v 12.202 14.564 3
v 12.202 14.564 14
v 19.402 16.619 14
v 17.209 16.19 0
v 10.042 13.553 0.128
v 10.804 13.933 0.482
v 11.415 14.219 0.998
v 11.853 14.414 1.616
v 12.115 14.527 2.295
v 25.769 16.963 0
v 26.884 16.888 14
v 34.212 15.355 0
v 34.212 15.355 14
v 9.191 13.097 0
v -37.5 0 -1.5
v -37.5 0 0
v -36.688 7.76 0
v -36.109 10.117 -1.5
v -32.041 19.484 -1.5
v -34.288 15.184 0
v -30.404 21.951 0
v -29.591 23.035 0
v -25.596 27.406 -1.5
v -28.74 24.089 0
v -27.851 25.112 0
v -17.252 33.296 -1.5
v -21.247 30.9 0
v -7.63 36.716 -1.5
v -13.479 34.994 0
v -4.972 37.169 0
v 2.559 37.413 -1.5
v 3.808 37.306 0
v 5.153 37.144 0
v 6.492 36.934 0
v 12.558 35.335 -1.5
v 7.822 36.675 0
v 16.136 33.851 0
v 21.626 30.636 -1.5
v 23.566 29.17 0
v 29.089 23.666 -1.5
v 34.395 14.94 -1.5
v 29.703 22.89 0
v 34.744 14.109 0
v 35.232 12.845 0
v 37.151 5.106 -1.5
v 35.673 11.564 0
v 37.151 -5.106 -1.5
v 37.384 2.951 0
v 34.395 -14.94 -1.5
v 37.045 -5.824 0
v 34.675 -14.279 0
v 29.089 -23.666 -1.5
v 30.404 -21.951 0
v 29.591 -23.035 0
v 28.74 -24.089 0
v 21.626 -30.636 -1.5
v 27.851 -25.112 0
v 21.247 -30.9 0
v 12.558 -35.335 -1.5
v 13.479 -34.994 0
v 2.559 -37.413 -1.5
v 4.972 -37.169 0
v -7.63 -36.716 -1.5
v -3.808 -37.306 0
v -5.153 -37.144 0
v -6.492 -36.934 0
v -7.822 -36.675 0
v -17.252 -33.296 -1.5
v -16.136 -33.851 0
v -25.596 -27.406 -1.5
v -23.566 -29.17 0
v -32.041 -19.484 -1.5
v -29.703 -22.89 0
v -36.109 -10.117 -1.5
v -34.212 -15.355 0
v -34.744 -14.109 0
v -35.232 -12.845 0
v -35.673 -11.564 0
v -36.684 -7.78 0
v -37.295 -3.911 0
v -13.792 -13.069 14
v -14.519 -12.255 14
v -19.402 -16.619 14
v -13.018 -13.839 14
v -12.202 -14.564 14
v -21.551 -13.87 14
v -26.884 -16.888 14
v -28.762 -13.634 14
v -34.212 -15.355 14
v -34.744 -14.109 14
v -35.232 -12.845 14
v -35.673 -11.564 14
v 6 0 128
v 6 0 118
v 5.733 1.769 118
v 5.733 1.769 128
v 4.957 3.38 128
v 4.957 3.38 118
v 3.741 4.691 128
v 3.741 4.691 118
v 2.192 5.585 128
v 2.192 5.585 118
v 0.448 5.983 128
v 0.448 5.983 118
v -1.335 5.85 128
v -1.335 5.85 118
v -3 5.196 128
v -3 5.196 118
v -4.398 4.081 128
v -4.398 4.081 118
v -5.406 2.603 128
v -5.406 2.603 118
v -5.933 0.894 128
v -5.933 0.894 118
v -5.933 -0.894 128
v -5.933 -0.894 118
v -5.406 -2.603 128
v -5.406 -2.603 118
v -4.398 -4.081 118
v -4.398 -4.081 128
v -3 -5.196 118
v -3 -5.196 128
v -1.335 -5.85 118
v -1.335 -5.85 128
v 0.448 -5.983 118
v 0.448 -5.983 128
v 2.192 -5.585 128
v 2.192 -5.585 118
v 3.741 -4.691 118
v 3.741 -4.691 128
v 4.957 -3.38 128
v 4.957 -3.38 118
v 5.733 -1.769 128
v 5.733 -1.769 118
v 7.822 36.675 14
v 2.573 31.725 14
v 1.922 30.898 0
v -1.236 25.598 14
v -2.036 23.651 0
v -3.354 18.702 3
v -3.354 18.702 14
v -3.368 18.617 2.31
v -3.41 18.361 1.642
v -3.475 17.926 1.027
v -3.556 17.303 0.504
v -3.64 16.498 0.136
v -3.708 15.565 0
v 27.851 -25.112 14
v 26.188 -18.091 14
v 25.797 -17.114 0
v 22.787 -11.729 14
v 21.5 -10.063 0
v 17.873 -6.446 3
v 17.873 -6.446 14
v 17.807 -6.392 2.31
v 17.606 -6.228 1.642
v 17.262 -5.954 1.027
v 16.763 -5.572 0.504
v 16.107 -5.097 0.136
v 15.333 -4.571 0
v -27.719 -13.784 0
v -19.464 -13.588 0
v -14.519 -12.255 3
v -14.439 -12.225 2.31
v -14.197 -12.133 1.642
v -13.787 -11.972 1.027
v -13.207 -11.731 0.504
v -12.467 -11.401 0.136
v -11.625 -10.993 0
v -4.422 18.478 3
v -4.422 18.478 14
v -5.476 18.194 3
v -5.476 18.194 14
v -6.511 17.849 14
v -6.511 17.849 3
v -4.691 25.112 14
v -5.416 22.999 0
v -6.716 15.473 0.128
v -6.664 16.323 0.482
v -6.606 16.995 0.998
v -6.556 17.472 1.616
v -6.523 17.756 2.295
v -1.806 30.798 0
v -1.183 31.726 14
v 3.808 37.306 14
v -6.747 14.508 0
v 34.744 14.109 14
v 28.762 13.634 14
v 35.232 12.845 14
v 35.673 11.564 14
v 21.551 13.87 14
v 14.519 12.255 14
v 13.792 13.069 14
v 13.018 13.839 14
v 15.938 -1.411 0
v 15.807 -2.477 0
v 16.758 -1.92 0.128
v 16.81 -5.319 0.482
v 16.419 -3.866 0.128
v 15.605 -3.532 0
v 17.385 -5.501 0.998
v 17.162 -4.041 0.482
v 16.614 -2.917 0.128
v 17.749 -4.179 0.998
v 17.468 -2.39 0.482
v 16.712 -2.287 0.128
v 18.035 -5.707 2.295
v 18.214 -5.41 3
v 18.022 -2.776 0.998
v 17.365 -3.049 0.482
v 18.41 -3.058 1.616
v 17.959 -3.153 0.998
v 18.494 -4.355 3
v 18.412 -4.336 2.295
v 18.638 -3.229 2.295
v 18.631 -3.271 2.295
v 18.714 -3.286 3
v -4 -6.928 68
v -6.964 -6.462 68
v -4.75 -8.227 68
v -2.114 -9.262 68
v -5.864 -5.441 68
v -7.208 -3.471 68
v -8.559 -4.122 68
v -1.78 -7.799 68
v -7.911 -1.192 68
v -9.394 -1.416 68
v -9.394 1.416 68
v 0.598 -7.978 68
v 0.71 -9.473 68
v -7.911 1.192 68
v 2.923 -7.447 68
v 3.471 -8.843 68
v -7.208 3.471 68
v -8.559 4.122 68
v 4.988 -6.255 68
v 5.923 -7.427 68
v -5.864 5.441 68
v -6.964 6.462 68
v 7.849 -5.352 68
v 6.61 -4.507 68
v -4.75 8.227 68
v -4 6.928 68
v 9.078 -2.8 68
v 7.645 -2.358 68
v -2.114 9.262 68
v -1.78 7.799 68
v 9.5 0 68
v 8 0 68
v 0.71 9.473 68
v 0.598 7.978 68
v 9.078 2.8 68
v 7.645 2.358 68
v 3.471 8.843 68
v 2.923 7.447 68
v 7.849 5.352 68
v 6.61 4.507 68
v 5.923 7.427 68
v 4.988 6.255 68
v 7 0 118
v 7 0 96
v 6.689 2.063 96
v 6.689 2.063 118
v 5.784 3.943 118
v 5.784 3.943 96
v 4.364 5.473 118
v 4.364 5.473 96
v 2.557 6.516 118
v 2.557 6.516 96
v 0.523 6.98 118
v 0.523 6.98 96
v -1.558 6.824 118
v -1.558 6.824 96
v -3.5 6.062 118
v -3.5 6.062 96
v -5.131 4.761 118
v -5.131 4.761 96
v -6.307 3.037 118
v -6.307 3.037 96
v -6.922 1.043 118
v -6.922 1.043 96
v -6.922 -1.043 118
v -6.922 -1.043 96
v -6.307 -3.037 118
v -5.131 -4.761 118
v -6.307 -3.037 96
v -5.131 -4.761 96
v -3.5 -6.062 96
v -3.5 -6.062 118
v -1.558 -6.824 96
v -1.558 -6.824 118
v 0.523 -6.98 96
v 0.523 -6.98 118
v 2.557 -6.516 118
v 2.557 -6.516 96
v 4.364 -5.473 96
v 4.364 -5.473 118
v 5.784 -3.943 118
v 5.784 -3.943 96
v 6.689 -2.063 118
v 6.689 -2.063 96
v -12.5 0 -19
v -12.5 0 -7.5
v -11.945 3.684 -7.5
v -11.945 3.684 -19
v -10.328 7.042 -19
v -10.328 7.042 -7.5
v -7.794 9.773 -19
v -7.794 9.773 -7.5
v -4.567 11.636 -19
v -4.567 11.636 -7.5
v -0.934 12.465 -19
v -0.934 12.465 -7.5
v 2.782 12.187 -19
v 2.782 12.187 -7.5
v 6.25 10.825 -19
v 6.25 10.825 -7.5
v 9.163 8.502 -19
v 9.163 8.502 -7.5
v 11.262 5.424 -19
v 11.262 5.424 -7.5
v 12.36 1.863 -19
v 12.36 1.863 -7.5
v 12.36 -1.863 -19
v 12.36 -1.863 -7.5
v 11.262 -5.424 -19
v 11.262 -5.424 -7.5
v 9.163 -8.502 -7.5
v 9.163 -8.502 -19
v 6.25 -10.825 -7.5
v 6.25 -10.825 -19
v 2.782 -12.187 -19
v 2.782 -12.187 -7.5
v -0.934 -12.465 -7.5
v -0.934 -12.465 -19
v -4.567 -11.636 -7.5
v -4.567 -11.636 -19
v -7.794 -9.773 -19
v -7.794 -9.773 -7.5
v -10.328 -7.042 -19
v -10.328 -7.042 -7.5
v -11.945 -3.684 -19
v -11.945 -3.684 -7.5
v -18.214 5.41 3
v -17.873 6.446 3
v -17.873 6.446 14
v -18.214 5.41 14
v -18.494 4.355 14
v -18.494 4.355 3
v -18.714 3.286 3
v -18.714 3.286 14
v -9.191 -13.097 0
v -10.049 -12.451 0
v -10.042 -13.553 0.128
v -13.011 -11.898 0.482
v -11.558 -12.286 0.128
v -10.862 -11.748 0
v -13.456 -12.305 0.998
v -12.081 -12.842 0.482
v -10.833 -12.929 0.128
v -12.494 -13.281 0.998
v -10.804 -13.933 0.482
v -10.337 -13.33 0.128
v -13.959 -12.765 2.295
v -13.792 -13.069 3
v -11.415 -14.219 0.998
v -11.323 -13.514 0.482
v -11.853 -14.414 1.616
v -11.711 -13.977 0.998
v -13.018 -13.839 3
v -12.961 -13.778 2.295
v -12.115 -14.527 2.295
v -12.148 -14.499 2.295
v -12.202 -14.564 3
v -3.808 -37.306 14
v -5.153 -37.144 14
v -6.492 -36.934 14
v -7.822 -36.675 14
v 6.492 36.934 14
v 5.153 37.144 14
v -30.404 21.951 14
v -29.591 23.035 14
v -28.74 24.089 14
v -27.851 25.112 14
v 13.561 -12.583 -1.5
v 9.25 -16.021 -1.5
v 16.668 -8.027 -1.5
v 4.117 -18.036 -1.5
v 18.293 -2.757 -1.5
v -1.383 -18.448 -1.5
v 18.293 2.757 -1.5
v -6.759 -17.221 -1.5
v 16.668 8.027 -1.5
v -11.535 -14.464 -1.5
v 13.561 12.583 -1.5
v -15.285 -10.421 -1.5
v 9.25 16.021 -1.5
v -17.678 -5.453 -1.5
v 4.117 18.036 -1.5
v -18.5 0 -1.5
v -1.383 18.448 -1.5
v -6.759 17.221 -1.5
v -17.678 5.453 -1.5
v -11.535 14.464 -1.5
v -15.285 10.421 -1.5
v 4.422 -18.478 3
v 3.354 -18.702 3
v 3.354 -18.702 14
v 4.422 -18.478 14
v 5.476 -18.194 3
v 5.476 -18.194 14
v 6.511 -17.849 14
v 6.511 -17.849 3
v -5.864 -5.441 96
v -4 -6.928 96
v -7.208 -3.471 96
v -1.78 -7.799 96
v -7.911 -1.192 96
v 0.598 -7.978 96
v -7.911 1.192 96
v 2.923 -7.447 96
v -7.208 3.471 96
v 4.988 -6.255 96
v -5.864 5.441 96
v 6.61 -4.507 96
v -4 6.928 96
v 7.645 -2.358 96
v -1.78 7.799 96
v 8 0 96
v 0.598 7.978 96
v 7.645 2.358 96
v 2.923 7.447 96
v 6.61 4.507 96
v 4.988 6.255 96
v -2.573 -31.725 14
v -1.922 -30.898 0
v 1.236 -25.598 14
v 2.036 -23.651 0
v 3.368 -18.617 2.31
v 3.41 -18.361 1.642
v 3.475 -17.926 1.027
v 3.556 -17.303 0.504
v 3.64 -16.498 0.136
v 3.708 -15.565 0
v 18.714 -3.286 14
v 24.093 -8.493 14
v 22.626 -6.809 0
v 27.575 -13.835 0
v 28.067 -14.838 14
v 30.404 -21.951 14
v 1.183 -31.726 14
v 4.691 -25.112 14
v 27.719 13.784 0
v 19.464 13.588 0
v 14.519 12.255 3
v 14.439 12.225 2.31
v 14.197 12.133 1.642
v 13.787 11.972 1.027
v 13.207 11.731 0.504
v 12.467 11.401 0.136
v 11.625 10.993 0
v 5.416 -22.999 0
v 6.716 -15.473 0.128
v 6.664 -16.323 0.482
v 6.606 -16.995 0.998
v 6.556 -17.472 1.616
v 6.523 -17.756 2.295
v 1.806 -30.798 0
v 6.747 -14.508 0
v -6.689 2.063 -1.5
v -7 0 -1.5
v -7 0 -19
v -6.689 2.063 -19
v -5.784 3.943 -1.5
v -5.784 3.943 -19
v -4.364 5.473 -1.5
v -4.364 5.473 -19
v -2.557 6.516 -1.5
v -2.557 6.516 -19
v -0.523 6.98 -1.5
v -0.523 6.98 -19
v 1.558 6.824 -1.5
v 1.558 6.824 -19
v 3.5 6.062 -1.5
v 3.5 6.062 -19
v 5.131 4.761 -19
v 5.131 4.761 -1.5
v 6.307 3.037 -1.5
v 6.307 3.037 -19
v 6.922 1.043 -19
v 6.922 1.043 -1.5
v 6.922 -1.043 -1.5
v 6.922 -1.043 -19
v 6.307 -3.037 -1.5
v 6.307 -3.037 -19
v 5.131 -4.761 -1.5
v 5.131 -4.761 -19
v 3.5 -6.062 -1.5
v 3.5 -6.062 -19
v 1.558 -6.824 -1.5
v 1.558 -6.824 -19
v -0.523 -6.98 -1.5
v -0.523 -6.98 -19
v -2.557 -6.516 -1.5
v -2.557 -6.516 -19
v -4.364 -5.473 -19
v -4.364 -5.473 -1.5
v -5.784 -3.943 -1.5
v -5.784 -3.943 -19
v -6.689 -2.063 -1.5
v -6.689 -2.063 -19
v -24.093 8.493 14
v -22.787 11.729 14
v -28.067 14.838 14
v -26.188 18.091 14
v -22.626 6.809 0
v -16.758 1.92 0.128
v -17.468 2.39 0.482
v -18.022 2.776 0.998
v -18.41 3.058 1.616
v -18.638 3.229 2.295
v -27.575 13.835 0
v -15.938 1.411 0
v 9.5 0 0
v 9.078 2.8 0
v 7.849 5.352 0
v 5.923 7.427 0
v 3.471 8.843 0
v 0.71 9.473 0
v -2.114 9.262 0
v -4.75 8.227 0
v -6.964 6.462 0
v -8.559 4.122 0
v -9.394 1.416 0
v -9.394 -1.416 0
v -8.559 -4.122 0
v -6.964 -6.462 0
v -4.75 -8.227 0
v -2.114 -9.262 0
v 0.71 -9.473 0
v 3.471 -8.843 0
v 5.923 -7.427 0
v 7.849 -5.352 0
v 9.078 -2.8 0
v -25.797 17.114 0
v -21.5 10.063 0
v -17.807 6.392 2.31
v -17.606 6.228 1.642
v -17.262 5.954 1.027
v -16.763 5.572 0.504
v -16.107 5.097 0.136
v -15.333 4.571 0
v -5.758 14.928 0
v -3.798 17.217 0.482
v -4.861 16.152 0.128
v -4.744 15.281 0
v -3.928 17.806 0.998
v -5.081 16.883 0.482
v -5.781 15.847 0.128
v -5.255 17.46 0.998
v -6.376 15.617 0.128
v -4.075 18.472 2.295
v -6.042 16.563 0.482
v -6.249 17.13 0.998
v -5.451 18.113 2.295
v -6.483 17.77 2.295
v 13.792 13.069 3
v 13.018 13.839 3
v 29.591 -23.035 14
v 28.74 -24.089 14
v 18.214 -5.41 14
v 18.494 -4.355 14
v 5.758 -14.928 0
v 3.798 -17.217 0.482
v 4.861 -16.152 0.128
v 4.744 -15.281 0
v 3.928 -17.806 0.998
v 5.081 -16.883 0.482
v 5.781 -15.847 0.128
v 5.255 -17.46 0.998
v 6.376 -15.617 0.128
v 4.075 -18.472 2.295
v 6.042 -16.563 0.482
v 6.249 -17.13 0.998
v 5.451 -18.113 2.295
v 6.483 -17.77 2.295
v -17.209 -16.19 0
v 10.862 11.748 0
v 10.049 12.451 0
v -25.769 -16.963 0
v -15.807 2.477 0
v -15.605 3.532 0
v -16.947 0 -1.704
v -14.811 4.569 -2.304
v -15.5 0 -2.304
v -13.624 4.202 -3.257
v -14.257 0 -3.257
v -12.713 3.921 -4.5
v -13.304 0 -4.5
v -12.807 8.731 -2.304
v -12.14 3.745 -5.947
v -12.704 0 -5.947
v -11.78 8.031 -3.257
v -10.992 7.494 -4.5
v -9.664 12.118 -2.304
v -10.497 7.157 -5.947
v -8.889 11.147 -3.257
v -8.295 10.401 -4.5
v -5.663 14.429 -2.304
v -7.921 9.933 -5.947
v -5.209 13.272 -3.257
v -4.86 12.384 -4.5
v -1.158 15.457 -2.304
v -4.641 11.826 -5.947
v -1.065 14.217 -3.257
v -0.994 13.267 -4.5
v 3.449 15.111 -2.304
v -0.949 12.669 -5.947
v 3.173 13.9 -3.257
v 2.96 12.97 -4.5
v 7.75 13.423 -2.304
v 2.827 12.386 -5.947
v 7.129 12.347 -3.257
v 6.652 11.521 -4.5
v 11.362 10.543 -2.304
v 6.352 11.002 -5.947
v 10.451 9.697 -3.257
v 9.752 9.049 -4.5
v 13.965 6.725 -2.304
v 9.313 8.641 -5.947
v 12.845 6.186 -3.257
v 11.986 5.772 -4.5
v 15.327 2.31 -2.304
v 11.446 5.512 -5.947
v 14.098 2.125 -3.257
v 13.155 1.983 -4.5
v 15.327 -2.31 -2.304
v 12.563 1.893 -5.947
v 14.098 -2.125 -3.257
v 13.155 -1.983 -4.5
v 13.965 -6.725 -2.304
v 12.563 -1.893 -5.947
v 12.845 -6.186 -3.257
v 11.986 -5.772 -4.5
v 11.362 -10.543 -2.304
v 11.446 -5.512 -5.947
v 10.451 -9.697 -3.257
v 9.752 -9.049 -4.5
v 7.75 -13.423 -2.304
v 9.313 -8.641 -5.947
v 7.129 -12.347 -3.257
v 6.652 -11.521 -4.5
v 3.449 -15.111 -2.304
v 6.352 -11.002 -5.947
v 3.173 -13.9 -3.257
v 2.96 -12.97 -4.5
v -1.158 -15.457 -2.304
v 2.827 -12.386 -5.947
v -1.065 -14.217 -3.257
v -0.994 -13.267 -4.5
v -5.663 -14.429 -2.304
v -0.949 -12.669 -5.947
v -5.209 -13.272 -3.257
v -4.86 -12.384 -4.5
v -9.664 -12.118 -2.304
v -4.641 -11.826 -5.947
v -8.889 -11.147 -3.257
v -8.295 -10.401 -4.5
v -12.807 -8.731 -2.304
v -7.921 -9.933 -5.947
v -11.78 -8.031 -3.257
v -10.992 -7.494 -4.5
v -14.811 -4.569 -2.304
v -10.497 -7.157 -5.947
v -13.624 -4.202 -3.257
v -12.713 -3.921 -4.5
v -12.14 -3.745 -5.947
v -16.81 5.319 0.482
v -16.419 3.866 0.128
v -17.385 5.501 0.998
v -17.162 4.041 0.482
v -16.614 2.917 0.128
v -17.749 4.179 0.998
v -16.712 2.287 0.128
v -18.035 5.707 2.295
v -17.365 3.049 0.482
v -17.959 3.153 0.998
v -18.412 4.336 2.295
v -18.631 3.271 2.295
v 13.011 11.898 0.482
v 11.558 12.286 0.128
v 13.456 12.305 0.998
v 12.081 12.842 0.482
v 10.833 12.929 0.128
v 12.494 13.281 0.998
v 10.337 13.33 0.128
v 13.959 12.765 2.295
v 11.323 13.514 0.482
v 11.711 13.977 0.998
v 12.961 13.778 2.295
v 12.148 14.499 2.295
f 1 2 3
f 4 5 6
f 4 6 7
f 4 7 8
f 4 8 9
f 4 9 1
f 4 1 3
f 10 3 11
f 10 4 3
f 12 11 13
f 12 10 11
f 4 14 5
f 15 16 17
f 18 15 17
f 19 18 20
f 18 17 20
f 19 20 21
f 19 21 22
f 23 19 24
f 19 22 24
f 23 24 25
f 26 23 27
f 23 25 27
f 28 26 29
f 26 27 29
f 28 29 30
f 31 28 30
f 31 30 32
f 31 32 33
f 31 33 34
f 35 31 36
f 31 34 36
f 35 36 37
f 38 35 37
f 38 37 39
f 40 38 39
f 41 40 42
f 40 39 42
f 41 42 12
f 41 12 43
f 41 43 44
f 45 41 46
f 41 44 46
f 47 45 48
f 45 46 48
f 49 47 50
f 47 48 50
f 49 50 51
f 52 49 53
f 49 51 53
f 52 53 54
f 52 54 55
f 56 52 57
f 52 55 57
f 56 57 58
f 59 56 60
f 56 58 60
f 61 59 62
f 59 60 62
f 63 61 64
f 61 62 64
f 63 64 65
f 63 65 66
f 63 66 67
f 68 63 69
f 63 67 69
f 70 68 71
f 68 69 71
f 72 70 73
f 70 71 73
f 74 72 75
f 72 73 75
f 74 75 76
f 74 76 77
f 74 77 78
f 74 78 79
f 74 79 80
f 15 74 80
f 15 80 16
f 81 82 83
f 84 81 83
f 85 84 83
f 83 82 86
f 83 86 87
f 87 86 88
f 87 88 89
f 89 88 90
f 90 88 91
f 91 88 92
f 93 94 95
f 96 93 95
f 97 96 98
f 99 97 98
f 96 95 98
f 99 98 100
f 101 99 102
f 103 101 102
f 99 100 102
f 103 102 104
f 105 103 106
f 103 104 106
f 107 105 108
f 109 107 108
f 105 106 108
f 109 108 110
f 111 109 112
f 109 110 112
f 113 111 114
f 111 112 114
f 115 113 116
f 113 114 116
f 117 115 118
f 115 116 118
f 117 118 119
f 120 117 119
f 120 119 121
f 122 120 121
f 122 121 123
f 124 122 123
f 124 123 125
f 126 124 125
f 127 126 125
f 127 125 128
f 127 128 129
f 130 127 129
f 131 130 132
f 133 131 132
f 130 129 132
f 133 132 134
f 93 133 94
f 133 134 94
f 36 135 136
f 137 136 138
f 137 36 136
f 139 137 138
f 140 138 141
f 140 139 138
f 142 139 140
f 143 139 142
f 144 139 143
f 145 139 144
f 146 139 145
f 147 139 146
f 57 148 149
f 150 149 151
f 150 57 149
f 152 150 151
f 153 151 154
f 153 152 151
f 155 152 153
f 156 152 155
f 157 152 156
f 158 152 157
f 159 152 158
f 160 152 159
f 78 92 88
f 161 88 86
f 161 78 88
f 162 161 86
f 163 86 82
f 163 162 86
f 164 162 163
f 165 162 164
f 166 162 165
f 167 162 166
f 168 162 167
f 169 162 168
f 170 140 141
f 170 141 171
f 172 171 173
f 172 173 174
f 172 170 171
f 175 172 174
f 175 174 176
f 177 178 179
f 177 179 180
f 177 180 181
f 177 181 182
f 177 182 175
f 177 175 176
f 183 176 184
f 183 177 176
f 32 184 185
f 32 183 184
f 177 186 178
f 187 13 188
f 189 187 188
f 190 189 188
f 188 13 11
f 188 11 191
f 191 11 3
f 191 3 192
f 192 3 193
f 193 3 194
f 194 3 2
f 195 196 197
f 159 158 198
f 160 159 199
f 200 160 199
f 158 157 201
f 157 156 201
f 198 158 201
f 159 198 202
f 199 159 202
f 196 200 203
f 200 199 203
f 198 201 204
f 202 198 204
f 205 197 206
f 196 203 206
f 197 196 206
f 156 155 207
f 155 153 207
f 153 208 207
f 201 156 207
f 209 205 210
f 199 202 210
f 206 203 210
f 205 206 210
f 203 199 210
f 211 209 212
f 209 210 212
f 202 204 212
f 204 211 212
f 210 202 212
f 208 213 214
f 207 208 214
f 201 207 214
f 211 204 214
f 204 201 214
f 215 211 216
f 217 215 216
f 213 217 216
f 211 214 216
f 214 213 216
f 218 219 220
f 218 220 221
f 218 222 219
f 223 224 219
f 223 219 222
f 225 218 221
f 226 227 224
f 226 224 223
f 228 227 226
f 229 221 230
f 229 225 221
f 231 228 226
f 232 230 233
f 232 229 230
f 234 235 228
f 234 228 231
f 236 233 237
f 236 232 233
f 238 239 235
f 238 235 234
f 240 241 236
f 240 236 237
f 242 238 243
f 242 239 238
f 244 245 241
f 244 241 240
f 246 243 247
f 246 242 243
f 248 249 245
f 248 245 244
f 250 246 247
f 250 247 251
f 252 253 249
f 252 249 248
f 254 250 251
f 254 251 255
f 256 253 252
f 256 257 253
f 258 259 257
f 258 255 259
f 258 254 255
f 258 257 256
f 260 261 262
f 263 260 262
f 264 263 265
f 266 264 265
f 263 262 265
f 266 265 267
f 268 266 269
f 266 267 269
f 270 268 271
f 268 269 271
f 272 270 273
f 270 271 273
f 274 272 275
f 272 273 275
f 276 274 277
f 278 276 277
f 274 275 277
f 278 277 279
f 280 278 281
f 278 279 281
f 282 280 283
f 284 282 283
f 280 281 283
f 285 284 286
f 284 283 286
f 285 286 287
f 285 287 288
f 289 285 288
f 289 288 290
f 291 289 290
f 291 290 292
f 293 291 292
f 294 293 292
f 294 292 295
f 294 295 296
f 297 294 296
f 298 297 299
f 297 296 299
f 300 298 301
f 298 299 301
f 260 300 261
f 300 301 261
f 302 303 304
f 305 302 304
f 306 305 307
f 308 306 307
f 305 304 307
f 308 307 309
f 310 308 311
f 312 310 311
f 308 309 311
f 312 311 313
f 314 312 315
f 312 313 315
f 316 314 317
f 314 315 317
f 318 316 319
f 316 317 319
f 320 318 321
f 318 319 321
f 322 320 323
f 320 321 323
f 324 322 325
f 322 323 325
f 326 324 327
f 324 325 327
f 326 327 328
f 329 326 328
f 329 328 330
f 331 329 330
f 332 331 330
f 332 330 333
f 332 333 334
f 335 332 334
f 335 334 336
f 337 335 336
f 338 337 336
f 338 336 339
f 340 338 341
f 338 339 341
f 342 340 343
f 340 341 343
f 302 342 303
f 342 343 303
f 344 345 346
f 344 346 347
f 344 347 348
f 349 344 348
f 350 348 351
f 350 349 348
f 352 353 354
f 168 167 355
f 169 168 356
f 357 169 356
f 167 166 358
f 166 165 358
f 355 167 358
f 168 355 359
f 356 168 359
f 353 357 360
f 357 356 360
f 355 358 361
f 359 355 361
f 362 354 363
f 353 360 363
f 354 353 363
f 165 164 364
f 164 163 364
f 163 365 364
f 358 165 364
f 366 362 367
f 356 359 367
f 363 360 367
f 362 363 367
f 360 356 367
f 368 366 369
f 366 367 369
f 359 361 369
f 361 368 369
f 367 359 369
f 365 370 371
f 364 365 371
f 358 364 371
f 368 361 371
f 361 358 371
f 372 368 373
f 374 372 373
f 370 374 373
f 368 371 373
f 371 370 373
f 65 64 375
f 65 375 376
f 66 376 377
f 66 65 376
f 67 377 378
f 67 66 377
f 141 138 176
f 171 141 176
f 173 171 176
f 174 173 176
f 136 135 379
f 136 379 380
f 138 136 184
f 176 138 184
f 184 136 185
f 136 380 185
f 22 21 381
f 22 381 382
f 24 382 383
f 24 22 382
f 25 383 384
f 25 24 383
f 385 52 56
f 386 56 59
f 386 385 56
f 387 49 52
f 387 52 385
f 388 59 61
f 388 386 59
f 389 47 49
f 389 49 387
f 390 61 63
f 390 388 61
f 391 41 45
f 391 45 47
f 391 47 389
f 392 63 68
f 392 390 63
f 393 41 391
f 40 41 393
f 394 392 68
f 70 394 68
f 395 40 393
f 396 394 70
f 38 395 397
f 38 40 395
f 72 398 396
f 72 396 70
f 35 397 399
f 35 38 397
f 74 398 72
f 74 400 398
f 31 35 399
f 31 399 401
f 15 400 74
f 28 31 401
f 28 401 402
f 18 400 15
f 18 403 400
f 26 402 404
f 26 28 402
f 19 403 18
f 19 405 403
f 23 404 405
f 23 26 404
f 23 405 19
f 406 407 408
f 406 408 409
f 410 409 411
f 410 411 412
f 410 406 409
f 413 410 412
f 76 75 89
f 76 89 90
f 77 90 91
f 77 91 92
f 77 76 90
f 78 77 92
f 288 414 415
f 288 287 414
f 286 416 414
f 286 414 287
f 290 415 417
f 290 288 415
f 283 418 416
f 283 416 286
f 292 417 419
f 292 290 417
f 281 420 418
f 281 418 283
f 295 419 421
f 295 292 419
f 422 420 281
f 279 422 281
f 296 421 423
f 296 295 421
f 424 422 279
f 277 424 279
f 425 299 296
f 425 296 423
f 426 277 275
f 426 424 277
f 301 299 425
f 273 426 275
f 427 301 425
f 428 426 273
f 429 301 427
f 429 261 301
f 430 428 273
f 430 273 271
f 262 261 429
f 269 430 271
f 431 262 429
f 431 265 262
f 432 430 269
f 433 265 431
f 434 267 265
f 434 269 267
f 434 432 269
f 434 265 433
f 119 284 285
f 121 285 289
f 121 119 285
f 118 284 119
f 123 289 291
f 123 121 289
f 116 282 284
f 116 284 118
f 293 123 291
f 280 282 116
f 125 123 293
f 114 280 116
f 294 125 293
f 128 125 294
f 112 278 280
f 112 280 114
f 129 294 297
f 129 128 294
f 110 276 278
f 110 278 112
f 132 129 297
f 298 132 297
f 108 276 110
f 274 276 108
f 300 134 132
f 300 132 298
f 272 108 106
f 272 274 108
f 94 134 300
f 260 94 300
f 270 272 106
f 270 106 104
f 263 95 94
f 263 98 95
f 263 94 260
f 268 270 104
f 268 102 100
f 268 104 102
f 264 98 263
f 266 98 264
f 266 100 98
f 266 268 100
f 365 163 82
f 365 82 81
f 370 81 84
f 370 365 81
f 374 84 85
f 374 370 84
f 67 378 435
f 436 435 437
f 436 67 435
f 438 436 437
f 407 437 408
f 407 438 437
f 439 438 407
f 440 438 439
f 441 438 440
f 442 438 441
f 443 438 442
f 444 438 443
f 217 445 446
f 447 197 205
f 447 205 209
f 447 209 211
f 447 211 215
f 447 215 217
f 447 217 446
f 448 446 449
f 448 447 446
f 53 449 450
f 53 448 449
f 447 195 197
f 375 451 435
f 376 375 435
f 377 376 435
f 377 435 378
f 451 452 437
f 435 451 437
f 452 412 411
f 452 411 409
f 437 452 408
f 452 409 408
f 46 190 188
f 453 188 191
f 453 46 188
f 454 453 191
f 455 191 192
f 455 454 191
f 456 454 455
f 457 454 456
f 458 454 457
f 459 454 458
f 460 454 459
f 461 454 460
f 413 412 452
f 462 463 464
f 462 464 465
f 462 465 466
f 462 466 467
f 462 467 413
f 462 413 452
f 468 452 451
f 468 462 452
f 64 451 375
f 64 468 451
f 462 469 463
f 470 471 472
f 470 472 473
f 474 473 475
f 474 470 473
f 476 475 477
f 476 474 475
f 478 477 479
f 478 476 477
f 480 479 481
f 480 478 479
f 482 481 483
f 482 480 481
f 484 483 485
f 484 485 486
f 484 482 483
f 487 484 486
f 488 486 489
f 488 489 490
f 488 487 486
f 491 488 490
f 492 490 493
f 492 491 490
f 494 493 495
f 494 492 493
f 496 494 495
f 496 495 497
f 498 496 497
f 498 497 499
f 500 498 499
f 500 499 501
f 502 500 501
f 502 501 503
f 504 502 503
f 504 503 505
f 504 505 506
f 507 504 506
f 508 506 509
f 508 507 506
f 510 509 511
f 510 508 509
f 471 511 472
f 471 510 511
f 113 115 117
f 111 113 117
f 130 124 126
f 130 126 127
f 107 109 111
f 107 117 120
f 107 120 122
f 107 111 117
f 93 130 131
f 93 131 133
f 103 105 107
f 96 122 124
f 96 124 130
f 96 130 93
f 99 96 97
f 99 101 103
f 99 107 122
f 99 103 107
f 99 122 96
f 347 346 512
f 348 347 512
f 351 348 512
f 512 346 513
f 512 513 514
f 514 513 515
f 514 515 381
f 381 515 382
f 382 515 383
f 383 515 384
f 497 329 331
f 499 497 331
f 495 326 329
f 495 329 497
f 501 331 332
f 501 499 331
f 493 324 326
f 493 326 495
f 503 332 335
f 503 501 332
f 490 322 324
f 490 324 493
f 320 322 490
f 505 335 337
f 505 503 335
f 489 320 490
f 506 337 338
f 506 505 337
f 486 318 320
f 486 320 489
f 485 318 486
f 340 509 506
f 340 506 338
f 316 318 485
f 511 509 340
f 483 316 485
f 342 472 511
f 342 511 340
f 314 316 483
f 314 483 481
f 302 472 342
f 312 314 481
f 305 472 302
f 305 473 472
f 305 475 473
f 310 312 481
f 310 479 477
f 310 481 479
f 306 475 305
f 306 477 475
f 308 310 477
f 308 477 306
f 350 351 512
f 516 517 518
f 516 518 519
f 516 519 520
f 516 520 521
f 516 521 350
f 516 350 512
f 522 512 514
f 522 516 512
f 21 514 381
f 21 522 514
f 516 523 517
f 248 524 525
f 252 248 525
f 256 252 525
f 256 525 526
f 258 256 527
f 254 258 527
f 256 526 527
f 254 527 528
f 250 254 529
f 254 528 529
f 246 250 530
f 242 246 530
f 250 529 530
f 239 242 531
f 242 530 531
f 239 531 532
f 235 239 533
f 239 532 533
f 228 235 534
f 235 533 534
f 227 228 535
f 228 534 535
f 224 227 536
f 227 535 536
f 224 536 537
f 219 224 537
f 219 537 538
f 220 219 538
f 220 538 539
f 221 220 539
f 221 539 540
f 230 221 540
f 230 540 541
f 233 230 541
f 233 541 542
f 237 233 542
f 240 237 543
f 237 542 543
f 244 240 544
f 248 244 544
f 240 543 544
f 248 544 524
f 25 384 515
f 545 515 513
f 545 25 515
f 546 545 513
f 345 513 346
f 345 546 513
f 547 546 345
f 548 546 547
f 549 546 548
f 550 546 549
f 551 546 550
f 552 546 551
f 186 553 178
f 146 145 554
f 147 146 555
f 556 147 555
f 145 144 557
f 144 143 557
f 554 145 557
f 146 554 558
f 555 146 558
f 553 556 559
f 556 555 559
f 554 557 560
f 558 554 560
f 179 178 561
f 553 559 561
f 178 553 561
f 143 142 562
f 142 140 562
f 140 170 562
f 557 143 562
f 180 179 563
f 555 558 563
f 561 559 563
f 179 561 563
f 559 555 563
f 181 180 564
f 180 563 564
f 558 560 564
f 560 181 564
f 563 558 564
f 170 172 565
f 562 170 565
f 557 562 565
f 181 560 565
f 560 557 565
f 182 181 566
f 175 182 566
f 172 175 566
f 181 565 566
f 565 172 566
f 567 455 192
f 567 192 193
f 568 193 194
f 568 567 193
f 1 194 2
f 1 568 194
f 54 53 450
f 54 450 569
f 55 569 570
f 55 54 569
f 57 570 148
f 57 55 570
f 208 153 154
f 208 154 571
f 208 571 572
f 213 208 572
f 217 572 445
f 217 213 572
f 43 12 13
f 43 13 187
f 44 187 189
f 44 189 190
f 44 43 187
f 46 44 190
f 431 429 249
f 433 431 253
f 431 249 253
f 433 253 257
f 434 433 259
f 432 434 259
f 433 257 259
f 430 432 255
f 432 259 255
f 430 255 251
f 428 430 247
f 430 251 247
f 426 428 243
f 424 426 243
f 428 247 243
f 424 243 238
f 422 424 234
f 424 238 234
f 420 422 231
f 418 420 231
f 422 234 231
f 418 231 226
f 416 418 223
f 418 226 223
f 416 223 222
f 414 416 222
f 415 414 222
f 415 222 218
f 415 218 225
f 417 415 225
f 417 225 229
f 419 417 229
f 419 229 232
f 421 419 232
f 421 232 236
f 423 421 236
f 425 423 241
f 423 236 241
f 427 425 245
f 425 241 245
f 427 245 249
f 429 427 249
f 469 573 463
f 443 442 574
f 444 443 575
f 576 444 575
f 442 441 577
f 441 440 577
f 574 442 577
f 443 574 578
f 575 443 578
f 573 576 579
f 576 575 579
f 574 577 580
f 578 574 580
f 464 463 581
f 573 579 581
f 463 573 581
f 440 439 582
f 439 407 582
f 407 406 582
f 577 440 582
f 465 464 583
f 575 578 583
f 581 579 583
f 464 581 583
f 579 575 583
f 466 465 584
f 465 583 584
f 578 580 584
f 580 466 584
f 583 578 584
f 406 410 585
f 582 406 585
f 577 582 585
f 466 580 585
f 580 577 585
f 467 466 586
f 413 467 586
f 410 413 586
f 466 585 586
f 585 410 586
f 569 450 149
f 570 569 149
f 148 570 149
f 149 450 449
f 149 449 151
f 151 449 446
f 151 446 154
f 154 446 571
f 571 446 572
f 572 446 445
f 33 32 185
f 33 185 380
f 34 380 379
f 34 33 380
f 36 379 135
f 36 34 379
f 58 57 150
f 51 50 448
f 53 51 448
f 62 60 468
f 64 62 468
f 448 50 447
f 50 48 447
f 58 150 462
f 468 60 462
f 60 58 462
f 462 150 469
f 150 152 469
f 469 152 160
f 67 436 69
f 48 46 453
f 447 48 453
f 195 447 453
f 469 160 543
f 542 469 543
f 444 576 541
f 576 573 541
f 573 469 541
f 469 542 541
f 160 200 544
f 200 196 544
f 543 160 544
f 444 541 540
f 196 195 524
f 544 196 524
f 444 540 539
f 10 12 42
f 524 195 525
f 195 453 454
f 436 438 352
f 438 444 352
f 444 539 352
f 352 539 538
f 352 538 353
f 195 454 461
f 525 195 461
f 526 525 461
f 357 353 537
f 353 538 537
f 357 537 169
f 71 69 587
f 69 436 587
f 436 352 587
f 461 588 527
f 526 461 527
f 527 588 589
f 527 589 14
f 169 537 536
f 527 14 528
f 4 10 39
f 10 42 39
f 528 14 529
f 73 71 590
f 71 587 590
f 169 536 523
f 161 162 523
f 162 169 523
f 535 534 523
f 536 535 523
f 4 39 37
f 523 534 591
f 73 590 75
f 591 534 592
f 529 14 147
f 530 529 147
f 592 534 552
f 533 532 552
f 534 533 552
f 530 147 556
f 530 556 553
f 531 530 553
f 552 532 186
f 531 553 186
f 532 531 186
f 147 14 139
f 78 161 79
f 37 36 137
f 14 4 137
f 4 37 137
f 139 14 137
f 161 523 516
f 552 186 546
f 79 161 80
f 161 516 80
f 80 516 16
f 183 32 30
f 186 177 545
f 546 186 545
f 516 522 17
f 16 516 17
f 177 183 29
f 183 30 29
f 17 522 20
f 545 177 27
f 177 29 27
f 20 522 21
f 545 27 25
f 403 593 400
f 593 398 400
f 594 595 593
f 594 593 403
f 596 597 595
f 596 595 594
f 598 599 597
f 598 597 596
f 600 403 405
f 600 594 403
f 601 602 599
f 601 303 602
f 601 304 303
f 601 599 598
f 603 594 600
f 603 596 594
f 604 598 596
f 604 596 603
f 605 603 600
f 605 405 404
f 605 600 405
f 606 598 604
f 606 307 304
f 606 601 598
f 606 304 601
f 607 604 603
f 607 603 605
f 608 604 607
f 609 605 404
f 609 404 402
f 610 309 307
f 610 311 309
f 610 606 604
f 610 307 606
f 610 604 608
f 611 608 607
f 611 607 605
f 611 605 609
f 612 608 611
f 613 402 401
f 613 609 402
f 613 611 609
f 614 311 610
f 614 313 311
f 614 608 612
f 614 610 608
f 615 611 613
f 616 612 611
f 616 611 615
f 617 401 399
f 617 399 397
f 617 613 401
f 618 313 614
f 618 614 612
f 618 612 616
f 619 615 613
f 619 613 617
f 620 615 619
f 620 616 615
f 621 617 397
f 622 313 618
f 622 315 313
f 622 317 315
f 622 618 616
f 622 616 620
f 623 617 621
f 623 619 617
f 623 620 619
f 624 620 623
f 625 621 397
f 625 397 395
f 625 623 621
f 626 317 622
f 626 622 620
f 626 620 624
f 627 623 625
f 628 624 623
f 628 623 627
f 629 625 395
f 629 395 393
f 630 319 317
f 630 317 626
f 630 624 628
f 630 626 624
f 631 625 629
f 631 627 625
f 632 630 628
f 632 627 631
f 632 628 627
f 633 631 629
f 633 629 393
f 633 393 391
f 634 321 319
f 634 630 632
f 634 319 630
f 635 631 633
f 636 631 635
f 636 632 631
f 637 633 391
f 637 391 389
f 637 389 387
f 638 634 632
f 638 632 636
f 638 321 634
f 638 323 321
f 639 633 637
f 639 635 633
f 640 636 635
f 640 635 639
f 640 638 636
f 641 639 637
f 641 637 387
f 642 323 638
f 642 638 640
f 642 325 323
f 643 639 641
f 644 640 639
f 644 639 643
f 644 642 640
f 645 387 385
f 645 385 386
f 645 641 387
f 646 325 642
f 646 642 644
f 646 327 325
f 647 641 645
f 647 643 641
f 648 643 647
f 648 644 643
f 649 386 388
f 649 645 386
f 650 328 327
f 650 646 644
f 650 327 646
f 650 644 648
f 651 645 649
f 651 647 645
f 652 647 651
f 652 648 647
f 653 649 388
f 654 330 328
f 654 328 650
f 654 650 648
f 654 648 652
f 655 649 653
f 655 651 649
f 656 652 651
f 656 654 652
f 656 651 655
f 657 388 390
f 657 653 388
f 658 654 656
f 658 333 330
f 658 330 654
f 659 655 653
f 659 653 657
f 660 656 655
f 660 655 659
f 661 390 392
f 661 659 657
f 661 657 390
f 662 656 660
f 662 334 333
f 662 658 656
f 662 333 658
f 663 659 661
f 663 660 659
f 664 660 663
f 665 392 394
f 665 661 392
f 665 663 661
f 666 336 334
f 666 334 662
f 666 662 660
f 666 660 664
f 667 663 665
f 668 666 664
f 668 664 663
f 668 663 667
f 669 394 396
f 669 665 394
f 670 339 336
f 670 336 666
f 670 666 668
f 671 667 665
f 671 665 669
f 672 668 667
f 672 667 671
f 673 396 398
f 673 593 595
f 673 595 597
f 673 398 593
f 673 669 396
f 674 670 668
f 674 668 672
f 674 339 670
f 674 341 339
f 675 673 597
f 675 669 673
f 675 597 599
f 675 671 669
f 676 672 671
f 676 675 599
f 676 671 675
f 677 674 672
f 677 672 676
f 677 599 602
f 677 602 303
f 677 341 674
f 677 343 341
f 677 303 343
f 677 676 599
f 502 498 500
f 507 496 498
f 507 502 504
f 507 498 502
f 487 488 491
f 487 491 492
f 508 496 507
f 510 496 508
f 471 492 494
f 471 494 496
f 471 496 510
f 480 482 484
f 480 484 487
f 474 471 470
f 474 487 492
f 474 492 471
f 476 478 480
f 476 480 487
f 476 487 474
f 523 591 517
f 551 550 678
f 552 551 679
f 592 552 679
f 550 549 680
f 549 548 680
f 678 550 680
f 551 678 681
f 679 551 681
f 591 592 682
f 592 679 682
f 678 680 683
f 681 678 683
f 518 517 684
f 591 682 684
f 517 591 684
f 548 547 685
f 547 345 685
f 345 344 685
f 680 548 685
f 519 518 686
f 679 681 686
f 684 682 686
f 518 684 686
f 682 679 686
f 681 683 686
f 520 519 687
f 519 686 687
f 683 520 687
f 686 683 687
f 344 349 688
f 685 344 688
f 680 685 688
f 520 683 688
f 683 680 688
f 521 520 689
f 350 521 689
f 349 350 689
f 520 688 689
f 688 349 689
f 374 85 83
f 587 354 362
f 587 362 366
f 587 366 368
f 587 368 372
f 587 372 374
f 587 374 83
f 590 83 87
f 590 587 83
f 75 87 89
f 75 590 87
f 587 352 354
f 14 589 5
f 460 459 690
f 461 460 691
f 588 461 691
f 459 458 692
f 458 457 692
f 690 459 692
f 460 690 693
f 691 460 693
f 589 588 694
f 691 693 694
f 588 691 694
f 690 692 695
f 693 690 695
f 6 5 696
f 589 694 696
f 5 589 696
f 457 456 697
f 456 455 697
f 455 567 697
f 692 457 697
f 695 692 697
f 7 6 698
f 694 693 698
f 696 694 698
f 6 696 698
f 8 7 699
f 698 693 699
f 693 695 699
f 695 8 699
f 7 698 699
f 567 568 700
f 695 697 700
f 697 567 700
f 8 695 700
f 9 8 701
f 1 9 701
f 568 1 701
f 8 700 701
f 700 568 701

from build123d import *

# Parameters (mm, degrees)
SKETCH1_R           = 9.5
BOSS_EXTRUDE1_DEPTH = 68
SKETCH2_R           = 8
BOSS_EXTRUDE2_DEPTH = 28
SKETCH3_R           = 7
BOSS_EXTRUDE3_DEPTH = 22
SKETCH4_R           = 6
BOSS_EXTRUDE4_DEPTH = 10
SKETCH5_R           = 37.5
BOSS_EXTRUDE5_DEPTH = 1.5
SKETCH6_R           = 12.5
SKETCH6_R_2         = 7
BOSS_EXTRUDE6_DEPTH = 17.5
FILLET1_R           = 6
BOSS_EXTRUDE7_DEPTH = 14
FILLET2_R           = 3


with BuildPart() as part:
    # Sketch1 → Boss-Extrude1 (new body)
    with BuildSketch(Plane.XY):
        Circle(SKETCH1_R)
    extrude(amount=BOSS_EXTRUDE1_DEPTH)

    # Sketch2 → Boss-Extrude2 (add)
    with BuildSketch(Plane.XY.offset(68)):
        Circle(SKETCH2_R)
    extrude(amount=BOSS_EXTRUDE2_DEPTH)

    # Sketch3 → Boss-Extrude3 (add)
    with BuildSketch(Plane.XY.offset(96)):
        Circle(SKETCH3_R)
    extrude(amount=BOSS_EXTRUDE3_DEPTH)

    # Sketch4 → Boss-Extrude4 (add)
    with BuildSketch(Plane.XY.offset(118)):
        Circle(SKETCH4_R)
    extrude(amount=BOSS_EXTRUDE4_DEPTH)

    # Sketch5 → Boss-Extrude5 (add)
    with BuildSketch(Plane(origin=(0, 0, 0), x_dir=(-1, 0, 0), z_dir=(0, 0, -1))):
        Circle(SKETCH5_R)
    extrude(amount=BOSS_EXTRUDE5_DEPTH)

    # Sketch6 → Boss-Extrude6 (add)
    with BuildSketch(Plane(origin=(0, 0, -1.5), x_dir=(-1, 0, 0), z_dir=(0, 0, -1))):
        Circle(SKETCH6_R)
        Circle(SKETCH6_R_2, mode=Mode.SUBTRACT)
    extrude(amount=BOSS_EXTRUDE6_DEPTH)

    # Fillet1
    fillet1_edges = [part.edges().sort_by_distance(p)[0] for p in [
        (12.5, 0, -1.5),
    ]]
    fillet(fillet1_edges, radius=FILLET1_R)

    # Sketch8 → Boss-Extrude7 (add)
    with BuildSketch(Plane.XY):
        with BuildLine():
            ThreePointArc((-14.519262929, -12.255243939), (-13.410586975, -13.459426325), (-12.202382266, -14.563717487))
            ThreePointArc((-12.202382266, -14.563717487), (-23.134563913, -16.979972169), (-34.212072677, -15.355262394))
            ThreePointArc((-34.212072677, -15.355262394), (-34.993730727, -13.479199154), (-35.672601083, -11.563543228))
            ThreePointArc((-35.672601083, -11.563543228), (-25.163804407, -13.985042516), (-14.519262929, -12.255243939))
        make_face()
        with BuildLine():
            ThreePointArc((7.821978348, 36.675150371), (0.470500112, 28.78501513), (-3.353721116, 18.70167251))
            ThreePointArc((-3.353721116, 18.70167251), (-4.95091163, 18.343622162), (-6.511358184, 17.849431772))
            ThreePointArc((-6.511358184, 17.849431772), (-3.137805297, 28.525106139), (3.807989024, 37.306155251))
            ThreePointArc((3.807989024, 37.306155251), (5.823536473, 37.045059359), (7.821978348, 36.675150371))
        make_face()
        with BuildLine():
            ThreePointArc((-27.850622735, 25.111607143), (-24.693304295, 14.799972614), (-17.872984045, 6.446428571))
            ThreePointArc((-17.872984045, 6.446428571), (-18.361498605, 4.884195838), (-18.71374045, 3.285714286))
            ThreePointArc((-18.71374045, 3.285714286), (-26.27236921, 11.54513397), (-30.404083653, 21.950892857))
            ThreePointArc((-30.404083653, 21.950892857), (-29.170194253, 23.565860206), (-27.850622735, 25.111607143))
        make_face()
        with BuildLine():
            ThreePointArc((35.672601083, 11.563543228), (25.163804407, 13.985042516), (14.519262929, 12.255243939))
            ThreePointArc((14.519262929, 12.255243939), (13.410586975, 13.459426325), (12.202382266, 14.563717487))
            ThreePointArc((12.202382266, 14.563717487), (23.134563913, 16.979972169), (34.212072677, 15.355262394))
            ThreePointArc((34.212072677, 15.355262394), (34.993730727, 13.479199154), (35.672601083, 11.563543228))
        make_face()
        with BuildLine():
            ThreePointArc((27.850622735, -25.111607143), (24.693304295, -14.799972614), (17.872984045, -6.446428571))
            ThreePointArc((17.872984045, -6.446428571), (18.361498605, -4.884195838), (18.71374045, -3.285714286))
            ThreePointArc((18.71374045, -3.285714286), (26.27236921, -11.54513397), (30.404083653, -21.950892857))
            ThreePointArc((30.404083653, -21.950892857), (29.170194253, -23.565860206), (27.850622735, -25.111607143))
        make_face()
        with BuildLine():
            ThreePointArc((-7.821978348, -36.675150371), (-0.470500112, -28.78501513), (3.353721116, -18.70167251))
            ThreePointArc((3.353721116, -18.70167251), (4.95091163, -18.343622162), (6.511358184, -17.849431772))
            ThreePointArc((6.511358184, -17.849431772), (3.137805297, -28.525106139), (-3.807989024, -37.306155251))
            ThreePointArc((-3.807989024, -37.306155251), (-5.823536473, -37.045059359), (-7.821978348, -36.675150371))
        make_face()
    extrude(amount=BOSS_EXTRUDE7_DEPTH)

    # Fillet2
    fillet2_edges = [part.edges().sort_by_distance(p)[0] for p in [
        (-18.361498605, 4.884195838, 0),
        (-4.95091163, 18.343622162, 0),
        (13.410586975, 13.459426325, 0),
        (18.361498605, -4.884195838, 0),
        (4.95091163, -18.343622162, 0),
        (-13.410586975, -13.459426325, 0),
    ]]
    fillet(fillet2_edges, radius=FILLET2_R)


solid = part.part
